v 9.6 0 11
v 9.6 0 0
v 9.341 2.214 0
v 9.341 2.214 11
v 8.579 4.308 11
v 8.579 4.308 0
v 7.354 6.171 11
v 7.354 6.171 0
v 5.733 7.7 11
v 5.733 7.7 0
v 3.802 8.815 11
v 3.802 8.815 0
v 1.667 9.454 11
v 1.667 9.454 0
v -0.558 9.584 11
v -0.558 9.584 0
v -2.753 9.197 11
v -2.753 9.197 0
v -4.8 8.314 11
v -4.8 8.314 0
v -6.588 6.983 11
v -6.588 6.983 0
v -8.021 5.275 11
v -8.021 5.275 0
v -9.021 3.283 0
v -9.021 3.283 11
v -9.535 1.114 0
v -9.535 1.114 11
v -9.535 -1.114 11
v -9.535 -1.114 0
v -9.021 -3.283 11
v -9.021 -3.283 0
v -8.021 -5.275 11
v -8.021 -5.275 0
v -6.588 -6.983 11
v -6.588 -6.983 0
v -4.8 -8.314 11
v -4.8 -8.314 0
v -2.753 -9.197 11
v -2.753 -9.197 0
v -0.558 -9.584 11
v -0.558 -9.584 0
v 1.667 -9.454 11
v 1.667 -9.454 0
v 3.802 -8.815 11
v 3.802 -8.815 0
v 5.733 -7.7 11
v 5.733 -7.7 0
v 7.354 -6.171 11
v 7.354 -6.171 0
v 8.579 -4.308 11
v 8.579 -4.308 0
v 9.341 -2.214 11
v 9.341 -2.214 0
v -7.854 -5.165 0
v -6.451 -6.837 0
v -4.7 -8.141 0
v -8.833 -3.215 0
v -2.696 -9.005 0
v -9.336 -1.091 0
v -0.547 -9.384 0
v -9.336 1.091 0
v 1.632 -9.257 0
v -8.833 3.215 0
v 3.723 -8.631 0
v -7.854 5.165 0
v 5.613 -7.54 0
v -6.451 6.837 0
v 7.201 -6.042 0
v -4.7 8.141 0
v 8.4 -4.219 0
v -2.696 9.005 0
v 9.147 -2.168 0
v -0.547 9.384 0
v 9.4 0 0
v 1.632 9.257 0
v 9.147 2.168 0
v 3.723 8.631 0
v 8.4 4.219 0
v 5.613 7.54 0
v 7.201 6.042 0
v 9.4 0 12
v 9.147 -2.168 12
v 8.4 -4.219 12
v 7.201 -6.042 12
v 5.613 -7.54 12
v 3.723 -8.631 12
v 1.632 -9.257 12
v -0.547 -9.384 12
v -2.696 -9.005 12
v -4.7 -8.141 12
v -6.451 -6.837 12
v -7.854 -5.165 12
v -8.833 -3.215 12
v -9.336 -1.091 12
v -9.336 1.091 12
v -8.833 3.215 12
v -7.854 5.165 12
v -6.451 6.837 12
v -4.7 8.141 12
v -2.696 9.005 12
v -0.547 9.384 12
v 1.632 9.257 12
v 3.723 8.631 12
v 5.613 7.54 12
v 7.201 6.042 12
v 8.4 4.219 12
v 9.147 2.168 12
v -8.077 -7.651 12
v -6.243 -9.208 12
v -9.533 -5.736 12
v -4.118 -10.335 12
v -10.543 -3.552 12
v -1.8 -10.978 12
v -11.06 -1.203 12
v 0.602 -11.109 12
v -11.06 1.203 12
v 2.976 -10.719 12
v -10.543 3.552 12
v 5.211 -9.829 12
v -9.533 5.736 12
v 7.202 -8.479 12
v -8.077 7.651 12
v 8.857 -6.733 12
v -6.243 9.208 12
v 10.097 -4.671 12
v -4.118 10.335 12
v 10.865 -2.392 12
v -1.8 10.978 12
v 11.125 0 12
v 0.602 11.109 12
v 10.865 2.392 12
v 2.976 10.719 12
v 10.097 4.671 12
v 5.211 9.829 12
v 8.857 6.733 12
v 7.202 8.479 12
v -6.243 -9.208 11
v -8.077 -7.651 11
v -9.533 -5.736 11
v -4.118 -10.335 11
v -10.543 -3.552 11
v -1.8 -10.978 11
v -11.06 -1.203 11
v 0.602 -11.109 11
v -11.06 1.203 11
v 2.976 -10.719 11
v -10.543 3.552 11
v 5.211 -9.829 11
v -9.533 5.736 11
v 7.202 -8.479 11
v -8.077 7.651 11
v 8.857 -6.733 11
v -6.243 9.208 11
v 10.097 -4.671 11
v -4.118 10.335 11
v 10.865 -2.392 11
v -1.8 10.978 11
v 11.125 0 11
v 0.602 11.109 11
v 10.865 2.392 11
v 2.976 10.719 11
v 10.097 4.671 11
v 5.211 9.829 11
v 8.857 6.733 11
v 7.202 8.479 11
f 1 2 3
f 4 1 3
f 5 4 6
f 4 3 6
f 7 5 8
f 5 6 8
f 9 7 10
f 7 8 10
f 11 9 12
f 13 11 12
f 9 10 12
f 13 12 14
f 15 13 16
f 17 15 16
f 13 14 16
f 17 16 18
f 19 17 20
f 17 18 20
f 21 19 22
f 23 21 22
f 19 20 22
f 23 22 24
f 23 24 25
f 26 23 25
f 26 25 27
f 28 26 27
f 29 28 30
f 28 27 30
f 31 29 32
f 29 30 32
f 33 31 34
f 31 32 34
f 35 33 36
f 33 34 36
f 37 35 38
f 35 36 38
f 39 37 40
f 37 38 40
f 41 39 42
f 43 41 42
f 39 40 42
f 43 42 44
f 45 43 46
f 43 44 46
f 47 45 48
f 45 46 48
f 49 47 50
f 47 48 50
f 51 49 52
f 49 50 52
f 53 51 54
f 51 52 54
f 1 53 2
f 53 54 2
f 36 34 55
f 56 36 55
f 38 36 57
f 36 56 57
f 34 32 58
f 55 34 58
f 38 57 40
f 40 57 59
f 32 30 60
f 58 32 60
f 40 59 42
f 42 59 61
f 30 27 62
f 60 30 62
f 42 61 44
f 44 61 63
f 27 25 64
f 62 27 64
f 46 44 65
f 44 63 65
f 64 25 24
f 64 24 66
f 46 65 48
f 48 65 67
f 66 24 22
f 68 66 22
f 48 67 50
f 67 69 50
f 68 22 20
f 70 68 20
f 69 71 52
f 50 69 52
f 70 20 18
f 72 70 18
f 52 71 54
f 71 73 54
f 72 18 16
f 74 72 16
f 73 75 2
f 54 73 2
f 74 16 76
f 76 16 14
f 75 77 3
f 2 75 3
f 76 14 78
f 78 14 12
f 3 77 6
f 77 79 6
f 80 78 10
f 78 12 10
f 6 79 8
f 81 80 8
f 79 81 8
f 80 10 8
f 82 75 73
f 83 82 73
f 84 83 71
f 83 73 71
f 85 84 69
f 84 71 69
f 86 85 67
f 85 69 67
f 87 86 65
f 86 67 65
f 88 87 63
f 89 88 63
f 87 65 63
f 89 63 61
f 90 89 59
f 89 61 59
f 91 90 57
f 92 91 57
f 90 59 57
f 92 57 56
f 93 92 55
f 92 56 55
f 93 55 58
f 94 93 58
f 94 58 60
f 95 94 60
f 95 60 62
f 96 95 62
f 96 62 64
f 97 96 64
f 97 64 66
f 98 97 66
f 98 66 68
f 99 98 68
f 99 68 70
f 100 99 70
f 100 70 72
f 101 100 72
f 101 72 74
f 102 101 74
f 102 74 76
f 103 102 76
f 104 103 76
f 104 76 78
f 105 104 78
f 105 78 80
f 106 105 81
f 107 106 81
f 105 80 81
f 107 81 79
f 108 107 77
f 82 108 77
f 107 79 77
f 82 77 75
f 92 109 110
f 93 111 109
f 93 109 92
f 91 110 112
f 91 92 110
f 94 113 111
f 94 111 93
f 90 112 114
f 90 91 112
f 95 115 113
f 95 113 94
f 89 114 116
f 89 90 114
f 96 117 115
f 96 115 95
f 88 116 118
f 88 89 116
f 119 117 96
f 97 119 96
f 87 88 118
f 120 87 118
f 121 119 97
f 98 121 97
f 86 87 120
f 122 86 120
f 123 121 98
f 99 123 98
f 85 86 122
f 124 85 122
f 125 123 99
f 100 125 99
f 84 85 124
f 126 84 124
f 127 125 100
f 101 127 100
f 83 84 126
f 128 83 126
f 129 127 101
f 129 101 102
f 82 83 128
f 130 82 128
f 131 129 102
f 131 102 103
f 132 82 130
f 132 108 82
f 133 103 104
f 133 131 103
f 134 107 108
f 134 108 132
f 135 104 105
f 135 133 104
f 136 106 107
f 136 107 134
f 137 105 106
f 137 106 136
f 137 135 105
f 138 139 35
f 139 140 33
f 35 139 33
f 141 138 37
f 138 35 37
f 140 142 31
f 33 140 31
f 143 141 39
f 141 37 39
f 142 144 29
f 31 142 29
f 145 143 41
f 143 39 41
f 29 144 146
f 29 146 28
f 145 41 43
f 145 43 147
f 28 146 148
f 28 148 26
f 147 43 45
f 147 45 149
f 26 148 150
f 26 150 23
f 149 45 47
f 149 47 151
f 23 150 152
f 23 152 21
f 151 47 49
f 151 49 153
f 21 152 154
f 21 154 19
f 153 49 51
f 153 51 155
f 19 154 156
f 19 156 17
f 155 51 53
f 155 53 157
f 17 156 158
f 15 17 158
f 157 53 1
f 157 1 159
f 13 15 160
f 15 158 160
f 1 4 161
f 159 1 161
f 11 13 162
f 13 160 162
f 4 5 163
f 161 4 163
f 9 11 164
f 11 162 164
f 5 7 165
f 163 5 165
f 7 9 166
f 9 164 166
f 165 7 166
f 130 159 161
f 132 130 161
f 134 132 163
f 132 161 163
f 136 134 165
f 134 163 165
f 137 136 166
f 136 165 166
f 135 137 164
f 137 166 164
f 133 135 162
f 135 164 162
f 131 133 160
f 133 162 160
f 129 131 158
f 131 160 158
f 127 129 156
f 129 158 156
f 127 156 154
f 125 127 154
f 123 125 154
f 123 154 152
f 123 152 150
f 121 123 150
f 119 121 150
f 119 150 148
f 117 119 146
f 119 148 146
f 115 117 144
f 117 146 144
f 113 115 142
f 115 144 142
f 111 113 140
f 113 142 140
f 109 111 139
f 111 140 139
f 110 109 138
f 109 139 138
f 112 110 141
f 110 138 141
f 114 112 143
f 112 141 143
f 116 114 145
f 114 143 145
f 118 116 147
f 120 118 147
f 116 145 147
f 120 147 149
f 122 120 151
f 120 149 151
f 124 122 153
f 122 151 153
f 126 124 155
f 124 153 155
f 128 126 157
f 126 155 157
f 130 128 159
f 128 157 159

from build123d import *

# Parameters (mm, degrees)
F0_R     = 9.6
F1_DEPTH = 11
F2_R     = 11.125
F3_DEPTH = 1
F4_R     = 9.4
F5_DEPTH = 12.001


with BuildPart() as f1:
    # F0 (on Top) → F1 (new body)
    with BuildSketch(Plane.XY):
        Circle(F0_R)
    extrude(amount=F1_DEPTH)

    # F2 (on face) → F3 (join)
    with BuildSketch(Plane.XY.offset(11)):
        Circle(F2_R)
    extrude(amount=F3_DEPTH)

    # F4 (on face) → F5 (cut, through all)
    with BuildSketch(Plane(origin=(0, 0, 0), x_dir=(1, 0, 0), z_dir=(0, 0, -1))):
        Circle(F4_R)
    extrude(amount=-F5_DEPTH, mode=Mode.SUBTRACT)


solid = f1.part
